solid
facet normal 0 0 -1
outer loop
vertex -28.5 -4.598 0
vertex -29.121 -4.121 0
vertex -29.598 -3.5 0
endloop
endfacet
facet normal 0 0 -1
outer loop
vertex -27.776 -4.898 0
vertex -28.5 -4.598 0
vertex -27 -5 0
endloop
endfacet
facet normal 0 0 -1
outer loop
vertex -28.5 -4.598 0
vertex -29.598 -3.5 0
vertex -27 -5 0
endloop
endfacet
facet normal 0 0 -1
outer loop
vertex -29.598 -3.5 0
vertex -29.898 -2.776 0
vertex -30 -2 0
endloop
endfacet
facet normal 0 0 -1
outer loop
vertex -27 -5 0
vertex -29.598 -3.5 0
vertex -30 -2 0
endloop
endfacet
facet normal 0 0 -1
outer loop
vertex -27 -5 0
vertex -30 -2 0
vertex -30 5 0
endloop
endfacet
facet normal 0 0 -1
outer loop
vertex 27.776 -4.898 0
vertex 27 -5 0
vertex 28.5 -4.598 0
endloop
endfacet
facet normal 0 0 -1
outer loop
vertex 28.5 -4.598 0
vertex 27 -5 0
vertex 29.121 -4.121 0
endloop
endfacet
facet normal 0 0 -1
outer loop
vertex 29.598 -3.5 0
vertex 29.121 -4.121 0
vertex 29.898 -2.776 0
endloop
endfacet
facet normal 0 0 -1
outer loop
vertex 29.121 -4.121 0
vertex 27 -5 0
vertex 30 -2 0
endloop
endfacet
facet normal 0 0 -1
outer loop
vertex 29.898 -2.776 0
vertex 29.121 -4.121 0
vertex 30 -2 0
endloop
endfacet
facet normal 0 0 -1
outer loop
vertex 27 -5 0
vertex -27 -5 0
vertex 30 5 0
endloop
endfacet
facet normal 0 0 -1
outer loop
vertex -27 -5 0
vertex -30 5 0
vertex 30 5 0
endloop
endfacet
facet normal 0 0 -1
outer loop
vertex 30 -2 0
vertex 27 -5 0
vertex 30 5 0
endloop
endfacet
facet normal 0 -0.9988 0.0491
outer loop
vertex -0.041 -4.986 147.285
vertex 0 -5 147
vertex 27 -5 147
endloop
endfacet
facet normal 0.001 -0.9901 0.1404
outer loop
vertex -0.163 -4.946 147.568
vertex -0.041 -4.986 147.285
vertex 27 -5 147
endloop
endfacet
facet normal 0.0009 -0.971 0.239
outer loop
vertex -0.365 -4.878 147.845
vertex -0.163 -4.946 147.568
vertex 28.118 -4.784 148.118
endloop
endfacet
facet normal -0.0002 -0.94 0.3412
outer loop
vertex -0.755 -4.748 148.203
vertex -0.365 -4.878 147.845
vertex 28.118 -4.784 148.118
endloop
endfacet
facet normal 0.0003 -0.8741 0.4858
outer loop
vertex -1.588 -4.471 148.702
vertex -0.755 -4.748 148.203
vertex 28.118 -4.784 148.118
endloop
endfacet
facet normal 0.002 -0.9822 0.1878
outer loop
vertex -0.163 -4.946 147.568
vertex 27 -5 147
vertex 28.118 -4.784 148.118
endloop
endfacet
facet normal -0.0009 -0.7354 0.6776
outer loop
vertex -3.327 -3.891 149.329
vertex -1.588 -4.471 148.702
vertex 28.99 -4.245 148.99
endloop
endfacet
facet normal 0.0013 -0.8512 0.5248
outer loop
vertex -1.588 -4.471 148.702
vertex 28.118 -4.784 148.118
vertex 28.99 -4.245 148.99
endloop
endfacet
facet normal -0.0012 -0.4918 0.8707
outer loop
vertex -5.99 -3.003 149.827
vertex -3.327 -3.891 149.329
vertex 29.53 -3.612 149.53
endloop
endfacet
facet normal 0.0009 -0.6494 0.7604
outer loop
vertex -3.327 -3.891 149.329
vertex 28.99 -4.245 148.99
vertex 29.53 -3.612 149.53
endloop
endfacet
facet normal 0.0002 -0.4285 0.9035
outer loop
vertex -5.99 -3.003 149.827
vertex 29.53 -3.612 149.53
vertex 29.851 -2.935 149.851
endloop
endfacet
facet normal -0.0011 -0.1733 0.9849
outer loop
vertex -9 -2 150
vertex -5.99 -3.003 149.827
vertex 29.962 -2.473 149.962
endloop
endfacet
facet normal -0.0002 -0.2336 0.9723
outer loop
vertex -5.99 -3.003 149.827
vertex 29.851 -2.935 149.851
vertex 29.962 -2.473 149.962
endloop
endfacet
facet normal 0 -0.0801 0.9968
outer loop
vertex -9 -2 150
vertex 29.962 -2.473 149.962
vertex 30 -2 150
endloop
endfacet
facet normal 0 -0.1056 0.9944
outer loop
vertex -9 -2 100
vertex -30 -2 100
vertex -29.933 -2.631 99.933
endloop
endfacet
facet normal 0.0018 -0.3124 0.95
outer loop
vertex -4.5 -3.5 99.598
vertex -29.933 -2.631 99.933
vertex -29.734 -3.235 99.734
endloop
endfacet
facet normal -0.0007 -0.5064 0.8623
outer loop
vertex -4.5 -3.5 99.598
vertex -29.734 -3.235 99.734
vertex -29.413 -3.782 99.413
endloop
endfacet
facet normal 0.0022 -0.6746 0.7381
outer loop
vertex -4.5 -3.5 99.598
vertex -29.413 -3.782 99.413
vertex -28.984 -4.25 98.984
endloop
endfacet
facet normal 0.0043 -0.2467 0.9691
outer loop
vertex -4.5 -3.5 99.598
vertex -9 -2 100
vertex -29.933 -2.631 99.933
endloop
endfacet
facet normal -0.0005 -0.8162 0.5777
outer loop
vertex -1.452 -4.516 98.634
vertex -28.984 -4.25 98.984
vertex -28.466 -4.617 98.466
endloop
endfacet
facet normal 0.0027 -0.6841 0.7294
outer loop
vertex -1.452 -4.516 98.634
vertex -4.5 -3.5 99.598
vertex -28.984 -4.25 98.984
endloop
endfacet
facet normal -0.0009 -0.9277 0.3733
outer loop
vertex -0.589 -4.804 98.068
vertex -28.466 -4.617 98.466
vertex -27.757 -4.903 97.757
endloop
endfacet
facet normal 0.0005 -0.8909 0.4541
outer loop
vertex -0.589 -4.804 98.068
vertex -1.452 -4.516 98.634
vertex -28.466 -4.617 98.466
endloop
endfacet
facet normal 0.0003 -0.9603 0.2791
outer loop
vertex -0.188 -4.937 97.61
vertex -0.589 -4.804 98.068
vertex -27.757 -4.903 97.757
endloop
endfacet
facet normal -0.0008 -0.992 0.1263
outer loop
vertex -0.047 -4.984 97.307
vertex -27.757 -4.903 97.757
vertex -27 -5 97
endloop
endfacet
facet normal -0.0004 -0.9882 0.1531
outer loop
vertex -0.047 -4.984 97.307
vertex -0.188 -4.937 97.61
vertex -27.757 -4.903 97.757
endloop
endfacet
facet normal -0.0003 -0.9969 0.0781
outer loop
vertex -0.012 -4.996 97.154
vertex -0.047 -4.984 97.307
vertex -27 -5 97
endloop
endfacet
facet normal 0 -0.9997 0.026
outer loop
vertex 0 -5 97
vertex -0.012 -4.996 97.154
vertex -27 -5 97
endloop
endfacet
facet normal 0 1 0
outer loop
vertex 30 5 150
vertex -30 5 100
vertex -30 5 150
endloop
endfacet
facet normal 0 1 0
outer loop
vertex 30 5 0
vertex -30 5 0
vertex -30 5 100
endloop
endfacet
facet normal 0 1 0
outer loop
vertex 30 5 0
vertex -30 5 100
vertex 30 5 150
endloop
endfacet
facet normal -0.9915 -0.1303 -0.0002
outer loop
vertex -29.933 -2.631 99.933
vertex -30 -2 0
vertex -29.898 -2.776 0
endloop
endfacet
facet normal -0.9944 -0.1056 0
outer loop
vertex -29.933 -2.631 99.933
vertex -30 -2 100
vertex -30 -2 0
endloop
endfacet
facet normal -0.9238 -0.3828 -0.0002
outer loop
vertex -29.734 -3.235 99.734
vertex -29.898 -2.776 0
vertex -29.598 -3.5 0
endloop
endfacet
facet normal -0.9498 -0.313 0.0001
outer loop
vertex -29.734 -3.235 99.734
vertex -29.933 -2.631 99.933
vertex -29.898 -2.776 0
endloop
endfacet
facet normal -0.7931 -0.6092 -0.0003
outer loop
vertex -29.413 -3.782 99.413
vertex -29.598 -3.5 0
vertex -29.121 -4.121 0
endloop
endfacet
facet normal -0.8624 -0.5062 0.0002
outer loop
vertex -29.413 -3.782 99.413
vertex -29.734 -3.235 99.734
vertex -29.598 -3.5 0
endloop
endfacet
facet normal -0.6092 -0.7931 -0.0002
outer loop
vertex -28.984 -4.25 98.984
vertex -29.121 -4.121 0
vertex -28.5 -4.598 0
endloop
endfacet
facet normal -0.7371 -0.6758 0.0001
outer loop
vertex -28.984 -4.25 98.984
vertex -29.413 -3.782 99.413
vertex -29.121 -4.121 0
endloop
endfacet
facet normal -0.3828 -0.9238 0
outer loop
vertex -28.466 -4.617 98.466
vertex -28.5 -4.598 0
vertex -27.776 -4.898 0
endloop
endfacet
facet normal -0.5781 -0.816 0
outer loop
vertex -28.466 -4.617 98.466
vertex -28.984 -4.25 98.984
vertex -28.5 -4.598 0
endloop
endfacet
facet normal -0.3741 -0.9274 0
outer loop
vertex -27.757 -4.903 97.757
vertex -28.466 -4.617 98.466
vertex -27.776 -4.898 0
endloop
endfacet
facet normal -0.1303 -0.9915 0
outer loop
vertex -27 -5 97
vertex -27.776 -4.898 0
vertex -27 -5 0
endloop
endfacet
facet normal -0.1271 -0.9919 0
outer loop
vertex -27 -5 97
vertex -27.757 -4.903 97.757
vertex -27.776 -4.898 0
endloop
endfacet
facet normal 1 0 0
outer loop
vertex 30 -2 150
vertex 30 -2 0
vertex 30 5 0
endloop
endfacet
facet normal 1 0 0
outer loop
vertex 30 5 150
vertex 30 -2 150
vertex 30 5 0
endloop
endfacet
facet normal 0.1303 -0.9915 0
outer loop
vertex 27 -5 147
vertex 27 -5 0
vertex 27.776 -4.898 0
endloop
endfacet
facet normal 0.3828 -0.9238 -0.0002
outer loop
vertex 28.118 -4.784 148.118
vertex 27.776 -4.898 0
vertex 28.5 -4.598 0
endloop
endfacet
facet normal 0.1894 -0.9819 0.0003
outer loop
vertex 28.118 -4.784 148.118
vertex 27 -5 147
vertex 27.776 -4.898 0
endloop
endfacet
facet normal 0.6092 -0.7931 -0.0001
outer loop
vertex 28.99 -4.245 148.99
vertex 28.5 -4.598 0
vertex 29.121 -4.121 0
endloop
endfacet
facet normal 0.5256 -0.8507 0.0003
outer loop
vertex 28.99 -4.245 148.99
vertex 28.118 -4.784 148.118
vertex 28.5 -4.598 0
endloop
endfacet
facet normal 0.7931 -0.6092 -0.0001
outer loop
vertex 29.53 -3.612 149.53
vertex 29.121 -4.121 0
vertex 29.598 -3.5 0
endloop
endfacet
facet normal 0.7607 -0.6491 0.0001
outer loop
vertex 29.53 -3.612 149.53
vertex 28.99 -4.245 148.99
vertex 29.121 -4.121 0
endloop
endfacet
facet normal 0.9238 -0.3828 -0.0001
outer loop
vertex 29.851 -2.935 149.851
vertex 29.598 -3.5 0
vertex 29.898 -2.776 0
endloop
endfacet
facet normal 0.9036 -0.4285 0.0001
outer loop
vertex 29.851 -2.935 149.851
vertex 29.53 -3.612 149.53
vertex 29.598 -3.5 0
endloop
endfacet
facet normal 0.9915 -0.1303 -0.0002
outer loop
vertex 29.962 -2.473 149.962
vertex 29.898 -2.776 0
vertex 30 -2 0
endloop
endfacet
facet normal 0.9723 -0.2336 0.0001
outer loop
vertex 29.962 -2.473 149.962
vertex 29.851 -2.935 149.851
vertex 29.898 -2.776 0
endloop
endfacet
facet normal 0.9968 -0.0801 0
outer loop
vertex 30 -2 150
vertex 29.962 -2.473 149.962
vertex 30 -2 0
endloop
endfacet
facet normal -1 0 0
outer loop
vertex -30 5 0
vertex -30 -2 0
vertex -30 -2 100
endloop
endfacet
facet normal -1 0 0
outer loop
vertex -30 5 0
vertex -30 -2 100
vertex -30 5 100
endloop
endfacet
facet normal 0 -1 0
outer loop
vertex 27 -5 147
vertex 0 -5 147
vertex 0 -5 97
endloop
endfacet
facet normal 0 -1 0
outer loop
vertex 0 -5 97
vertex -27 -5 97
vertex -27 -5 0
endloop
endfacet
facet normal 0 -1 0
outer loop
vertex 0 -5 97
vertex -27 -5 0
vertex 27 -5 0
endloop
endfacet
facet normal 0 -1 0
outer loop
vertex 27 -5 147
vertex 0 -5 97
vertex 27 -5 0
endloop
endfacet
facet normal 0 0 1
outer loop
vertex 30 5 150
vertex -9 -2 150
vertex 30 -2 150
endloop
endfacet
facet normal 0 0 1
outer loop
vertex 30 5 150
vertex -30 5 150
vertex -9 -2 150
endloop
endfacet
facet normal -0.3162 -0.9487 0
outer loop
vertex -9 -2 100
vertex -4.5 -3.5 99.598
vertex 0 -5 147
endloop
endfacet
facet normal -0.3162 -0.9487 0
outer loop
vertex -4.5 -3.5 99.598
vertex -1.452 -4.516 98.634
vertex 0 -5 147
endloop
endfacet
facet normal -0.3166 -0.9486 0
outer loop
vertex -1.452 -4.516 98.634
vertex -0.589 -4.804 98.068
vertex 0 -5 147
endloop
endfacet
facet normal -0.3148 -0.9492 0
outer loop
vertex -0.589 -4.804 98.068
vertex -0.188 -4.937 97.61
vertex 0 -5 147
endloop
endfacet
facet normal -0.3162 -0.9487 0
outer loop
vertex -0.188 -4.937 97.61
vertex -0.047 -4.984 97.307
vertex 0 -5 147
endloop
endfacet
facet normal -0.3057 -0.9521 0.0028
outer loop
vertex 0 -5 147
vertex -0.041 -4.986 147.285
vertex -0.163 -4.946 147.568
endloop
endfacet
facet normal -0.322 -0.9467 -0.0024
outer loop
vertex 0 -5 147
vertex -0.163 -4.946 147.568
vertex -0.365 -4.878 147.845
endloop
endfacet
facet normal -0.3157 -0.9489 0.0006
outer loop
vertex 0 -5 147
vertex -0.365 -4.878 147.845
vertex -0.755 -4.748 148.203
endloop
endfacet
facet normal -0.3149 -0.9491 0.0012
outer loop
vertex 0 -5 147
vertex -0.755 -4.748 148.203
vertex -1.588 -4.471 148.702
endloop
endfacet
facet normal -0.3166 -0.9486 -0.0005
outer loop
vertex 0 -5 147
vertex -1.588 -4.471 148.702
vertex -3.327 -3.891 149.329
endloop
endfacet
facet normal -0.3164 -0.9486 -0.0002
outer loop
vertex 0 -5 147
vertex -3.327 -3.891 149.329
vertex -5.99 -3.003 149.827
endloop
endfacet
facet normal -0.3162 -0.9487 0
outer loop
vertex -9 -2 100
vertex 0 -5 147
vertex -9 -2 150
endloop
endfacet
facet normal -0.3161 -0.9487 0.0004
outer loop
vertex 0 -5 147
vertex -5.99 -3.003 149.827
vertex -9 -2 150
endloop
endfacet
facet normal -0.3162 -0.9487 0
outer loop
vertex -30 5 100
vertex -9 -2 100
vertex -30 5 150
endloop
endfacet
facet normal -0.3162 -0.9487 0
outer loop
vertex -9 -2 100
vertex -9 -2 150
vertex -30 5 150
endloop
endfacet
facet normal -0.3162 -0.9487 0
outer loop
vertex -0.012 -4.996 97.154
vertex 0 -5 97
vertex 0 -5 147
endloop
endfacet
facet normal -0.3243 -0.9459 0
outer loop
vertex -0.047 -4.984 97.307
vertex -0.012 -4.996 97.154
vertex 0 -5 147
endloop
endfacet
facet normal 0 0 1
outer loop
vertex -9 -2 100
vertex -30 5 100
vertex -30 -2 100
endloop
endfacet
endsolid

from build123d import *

# Parameters (mm, degrees)
SKETCH1_W           = 60
SKETCH1_H           = 10
BOSS_EXTRUDE1_DEPTH = 150
CUT_EXTRUDE1_DEPTH  = 50
FILLET1_R           = 3


with BuildPart() as part:
    # Sketch1 → Boss-Extrude1 (new body)
    with BuildSketch(Plane.XY):
        Rectangle(SKETCH1_W, SKETCH1_H)
    extrude(amount=BOSS_EXTRUDE1_DEPTH)

    # Sketch2 → Cut-Extrude1 (cut)
    with BuildSketch(Plane.XY.offset(150)):
        Polygon((-30, 5), (-30, -5), (0, -5), align=None)
    extrude(amount=-CUT_EXTRUDE1_DEPTH, mode=Mode.SUBTRACT)

    # Fillet1
    fillet1_edges = [part.edges().sort_by_distance(p)[0] for p in [
        (15, -5, 150),
        (-30, -5, 50),
        (-15, -5, 100),
        (30, -5, 75),
    ]]
    fillet(fillet1_edges, radius=FILLET1_R)


solid = part.part
